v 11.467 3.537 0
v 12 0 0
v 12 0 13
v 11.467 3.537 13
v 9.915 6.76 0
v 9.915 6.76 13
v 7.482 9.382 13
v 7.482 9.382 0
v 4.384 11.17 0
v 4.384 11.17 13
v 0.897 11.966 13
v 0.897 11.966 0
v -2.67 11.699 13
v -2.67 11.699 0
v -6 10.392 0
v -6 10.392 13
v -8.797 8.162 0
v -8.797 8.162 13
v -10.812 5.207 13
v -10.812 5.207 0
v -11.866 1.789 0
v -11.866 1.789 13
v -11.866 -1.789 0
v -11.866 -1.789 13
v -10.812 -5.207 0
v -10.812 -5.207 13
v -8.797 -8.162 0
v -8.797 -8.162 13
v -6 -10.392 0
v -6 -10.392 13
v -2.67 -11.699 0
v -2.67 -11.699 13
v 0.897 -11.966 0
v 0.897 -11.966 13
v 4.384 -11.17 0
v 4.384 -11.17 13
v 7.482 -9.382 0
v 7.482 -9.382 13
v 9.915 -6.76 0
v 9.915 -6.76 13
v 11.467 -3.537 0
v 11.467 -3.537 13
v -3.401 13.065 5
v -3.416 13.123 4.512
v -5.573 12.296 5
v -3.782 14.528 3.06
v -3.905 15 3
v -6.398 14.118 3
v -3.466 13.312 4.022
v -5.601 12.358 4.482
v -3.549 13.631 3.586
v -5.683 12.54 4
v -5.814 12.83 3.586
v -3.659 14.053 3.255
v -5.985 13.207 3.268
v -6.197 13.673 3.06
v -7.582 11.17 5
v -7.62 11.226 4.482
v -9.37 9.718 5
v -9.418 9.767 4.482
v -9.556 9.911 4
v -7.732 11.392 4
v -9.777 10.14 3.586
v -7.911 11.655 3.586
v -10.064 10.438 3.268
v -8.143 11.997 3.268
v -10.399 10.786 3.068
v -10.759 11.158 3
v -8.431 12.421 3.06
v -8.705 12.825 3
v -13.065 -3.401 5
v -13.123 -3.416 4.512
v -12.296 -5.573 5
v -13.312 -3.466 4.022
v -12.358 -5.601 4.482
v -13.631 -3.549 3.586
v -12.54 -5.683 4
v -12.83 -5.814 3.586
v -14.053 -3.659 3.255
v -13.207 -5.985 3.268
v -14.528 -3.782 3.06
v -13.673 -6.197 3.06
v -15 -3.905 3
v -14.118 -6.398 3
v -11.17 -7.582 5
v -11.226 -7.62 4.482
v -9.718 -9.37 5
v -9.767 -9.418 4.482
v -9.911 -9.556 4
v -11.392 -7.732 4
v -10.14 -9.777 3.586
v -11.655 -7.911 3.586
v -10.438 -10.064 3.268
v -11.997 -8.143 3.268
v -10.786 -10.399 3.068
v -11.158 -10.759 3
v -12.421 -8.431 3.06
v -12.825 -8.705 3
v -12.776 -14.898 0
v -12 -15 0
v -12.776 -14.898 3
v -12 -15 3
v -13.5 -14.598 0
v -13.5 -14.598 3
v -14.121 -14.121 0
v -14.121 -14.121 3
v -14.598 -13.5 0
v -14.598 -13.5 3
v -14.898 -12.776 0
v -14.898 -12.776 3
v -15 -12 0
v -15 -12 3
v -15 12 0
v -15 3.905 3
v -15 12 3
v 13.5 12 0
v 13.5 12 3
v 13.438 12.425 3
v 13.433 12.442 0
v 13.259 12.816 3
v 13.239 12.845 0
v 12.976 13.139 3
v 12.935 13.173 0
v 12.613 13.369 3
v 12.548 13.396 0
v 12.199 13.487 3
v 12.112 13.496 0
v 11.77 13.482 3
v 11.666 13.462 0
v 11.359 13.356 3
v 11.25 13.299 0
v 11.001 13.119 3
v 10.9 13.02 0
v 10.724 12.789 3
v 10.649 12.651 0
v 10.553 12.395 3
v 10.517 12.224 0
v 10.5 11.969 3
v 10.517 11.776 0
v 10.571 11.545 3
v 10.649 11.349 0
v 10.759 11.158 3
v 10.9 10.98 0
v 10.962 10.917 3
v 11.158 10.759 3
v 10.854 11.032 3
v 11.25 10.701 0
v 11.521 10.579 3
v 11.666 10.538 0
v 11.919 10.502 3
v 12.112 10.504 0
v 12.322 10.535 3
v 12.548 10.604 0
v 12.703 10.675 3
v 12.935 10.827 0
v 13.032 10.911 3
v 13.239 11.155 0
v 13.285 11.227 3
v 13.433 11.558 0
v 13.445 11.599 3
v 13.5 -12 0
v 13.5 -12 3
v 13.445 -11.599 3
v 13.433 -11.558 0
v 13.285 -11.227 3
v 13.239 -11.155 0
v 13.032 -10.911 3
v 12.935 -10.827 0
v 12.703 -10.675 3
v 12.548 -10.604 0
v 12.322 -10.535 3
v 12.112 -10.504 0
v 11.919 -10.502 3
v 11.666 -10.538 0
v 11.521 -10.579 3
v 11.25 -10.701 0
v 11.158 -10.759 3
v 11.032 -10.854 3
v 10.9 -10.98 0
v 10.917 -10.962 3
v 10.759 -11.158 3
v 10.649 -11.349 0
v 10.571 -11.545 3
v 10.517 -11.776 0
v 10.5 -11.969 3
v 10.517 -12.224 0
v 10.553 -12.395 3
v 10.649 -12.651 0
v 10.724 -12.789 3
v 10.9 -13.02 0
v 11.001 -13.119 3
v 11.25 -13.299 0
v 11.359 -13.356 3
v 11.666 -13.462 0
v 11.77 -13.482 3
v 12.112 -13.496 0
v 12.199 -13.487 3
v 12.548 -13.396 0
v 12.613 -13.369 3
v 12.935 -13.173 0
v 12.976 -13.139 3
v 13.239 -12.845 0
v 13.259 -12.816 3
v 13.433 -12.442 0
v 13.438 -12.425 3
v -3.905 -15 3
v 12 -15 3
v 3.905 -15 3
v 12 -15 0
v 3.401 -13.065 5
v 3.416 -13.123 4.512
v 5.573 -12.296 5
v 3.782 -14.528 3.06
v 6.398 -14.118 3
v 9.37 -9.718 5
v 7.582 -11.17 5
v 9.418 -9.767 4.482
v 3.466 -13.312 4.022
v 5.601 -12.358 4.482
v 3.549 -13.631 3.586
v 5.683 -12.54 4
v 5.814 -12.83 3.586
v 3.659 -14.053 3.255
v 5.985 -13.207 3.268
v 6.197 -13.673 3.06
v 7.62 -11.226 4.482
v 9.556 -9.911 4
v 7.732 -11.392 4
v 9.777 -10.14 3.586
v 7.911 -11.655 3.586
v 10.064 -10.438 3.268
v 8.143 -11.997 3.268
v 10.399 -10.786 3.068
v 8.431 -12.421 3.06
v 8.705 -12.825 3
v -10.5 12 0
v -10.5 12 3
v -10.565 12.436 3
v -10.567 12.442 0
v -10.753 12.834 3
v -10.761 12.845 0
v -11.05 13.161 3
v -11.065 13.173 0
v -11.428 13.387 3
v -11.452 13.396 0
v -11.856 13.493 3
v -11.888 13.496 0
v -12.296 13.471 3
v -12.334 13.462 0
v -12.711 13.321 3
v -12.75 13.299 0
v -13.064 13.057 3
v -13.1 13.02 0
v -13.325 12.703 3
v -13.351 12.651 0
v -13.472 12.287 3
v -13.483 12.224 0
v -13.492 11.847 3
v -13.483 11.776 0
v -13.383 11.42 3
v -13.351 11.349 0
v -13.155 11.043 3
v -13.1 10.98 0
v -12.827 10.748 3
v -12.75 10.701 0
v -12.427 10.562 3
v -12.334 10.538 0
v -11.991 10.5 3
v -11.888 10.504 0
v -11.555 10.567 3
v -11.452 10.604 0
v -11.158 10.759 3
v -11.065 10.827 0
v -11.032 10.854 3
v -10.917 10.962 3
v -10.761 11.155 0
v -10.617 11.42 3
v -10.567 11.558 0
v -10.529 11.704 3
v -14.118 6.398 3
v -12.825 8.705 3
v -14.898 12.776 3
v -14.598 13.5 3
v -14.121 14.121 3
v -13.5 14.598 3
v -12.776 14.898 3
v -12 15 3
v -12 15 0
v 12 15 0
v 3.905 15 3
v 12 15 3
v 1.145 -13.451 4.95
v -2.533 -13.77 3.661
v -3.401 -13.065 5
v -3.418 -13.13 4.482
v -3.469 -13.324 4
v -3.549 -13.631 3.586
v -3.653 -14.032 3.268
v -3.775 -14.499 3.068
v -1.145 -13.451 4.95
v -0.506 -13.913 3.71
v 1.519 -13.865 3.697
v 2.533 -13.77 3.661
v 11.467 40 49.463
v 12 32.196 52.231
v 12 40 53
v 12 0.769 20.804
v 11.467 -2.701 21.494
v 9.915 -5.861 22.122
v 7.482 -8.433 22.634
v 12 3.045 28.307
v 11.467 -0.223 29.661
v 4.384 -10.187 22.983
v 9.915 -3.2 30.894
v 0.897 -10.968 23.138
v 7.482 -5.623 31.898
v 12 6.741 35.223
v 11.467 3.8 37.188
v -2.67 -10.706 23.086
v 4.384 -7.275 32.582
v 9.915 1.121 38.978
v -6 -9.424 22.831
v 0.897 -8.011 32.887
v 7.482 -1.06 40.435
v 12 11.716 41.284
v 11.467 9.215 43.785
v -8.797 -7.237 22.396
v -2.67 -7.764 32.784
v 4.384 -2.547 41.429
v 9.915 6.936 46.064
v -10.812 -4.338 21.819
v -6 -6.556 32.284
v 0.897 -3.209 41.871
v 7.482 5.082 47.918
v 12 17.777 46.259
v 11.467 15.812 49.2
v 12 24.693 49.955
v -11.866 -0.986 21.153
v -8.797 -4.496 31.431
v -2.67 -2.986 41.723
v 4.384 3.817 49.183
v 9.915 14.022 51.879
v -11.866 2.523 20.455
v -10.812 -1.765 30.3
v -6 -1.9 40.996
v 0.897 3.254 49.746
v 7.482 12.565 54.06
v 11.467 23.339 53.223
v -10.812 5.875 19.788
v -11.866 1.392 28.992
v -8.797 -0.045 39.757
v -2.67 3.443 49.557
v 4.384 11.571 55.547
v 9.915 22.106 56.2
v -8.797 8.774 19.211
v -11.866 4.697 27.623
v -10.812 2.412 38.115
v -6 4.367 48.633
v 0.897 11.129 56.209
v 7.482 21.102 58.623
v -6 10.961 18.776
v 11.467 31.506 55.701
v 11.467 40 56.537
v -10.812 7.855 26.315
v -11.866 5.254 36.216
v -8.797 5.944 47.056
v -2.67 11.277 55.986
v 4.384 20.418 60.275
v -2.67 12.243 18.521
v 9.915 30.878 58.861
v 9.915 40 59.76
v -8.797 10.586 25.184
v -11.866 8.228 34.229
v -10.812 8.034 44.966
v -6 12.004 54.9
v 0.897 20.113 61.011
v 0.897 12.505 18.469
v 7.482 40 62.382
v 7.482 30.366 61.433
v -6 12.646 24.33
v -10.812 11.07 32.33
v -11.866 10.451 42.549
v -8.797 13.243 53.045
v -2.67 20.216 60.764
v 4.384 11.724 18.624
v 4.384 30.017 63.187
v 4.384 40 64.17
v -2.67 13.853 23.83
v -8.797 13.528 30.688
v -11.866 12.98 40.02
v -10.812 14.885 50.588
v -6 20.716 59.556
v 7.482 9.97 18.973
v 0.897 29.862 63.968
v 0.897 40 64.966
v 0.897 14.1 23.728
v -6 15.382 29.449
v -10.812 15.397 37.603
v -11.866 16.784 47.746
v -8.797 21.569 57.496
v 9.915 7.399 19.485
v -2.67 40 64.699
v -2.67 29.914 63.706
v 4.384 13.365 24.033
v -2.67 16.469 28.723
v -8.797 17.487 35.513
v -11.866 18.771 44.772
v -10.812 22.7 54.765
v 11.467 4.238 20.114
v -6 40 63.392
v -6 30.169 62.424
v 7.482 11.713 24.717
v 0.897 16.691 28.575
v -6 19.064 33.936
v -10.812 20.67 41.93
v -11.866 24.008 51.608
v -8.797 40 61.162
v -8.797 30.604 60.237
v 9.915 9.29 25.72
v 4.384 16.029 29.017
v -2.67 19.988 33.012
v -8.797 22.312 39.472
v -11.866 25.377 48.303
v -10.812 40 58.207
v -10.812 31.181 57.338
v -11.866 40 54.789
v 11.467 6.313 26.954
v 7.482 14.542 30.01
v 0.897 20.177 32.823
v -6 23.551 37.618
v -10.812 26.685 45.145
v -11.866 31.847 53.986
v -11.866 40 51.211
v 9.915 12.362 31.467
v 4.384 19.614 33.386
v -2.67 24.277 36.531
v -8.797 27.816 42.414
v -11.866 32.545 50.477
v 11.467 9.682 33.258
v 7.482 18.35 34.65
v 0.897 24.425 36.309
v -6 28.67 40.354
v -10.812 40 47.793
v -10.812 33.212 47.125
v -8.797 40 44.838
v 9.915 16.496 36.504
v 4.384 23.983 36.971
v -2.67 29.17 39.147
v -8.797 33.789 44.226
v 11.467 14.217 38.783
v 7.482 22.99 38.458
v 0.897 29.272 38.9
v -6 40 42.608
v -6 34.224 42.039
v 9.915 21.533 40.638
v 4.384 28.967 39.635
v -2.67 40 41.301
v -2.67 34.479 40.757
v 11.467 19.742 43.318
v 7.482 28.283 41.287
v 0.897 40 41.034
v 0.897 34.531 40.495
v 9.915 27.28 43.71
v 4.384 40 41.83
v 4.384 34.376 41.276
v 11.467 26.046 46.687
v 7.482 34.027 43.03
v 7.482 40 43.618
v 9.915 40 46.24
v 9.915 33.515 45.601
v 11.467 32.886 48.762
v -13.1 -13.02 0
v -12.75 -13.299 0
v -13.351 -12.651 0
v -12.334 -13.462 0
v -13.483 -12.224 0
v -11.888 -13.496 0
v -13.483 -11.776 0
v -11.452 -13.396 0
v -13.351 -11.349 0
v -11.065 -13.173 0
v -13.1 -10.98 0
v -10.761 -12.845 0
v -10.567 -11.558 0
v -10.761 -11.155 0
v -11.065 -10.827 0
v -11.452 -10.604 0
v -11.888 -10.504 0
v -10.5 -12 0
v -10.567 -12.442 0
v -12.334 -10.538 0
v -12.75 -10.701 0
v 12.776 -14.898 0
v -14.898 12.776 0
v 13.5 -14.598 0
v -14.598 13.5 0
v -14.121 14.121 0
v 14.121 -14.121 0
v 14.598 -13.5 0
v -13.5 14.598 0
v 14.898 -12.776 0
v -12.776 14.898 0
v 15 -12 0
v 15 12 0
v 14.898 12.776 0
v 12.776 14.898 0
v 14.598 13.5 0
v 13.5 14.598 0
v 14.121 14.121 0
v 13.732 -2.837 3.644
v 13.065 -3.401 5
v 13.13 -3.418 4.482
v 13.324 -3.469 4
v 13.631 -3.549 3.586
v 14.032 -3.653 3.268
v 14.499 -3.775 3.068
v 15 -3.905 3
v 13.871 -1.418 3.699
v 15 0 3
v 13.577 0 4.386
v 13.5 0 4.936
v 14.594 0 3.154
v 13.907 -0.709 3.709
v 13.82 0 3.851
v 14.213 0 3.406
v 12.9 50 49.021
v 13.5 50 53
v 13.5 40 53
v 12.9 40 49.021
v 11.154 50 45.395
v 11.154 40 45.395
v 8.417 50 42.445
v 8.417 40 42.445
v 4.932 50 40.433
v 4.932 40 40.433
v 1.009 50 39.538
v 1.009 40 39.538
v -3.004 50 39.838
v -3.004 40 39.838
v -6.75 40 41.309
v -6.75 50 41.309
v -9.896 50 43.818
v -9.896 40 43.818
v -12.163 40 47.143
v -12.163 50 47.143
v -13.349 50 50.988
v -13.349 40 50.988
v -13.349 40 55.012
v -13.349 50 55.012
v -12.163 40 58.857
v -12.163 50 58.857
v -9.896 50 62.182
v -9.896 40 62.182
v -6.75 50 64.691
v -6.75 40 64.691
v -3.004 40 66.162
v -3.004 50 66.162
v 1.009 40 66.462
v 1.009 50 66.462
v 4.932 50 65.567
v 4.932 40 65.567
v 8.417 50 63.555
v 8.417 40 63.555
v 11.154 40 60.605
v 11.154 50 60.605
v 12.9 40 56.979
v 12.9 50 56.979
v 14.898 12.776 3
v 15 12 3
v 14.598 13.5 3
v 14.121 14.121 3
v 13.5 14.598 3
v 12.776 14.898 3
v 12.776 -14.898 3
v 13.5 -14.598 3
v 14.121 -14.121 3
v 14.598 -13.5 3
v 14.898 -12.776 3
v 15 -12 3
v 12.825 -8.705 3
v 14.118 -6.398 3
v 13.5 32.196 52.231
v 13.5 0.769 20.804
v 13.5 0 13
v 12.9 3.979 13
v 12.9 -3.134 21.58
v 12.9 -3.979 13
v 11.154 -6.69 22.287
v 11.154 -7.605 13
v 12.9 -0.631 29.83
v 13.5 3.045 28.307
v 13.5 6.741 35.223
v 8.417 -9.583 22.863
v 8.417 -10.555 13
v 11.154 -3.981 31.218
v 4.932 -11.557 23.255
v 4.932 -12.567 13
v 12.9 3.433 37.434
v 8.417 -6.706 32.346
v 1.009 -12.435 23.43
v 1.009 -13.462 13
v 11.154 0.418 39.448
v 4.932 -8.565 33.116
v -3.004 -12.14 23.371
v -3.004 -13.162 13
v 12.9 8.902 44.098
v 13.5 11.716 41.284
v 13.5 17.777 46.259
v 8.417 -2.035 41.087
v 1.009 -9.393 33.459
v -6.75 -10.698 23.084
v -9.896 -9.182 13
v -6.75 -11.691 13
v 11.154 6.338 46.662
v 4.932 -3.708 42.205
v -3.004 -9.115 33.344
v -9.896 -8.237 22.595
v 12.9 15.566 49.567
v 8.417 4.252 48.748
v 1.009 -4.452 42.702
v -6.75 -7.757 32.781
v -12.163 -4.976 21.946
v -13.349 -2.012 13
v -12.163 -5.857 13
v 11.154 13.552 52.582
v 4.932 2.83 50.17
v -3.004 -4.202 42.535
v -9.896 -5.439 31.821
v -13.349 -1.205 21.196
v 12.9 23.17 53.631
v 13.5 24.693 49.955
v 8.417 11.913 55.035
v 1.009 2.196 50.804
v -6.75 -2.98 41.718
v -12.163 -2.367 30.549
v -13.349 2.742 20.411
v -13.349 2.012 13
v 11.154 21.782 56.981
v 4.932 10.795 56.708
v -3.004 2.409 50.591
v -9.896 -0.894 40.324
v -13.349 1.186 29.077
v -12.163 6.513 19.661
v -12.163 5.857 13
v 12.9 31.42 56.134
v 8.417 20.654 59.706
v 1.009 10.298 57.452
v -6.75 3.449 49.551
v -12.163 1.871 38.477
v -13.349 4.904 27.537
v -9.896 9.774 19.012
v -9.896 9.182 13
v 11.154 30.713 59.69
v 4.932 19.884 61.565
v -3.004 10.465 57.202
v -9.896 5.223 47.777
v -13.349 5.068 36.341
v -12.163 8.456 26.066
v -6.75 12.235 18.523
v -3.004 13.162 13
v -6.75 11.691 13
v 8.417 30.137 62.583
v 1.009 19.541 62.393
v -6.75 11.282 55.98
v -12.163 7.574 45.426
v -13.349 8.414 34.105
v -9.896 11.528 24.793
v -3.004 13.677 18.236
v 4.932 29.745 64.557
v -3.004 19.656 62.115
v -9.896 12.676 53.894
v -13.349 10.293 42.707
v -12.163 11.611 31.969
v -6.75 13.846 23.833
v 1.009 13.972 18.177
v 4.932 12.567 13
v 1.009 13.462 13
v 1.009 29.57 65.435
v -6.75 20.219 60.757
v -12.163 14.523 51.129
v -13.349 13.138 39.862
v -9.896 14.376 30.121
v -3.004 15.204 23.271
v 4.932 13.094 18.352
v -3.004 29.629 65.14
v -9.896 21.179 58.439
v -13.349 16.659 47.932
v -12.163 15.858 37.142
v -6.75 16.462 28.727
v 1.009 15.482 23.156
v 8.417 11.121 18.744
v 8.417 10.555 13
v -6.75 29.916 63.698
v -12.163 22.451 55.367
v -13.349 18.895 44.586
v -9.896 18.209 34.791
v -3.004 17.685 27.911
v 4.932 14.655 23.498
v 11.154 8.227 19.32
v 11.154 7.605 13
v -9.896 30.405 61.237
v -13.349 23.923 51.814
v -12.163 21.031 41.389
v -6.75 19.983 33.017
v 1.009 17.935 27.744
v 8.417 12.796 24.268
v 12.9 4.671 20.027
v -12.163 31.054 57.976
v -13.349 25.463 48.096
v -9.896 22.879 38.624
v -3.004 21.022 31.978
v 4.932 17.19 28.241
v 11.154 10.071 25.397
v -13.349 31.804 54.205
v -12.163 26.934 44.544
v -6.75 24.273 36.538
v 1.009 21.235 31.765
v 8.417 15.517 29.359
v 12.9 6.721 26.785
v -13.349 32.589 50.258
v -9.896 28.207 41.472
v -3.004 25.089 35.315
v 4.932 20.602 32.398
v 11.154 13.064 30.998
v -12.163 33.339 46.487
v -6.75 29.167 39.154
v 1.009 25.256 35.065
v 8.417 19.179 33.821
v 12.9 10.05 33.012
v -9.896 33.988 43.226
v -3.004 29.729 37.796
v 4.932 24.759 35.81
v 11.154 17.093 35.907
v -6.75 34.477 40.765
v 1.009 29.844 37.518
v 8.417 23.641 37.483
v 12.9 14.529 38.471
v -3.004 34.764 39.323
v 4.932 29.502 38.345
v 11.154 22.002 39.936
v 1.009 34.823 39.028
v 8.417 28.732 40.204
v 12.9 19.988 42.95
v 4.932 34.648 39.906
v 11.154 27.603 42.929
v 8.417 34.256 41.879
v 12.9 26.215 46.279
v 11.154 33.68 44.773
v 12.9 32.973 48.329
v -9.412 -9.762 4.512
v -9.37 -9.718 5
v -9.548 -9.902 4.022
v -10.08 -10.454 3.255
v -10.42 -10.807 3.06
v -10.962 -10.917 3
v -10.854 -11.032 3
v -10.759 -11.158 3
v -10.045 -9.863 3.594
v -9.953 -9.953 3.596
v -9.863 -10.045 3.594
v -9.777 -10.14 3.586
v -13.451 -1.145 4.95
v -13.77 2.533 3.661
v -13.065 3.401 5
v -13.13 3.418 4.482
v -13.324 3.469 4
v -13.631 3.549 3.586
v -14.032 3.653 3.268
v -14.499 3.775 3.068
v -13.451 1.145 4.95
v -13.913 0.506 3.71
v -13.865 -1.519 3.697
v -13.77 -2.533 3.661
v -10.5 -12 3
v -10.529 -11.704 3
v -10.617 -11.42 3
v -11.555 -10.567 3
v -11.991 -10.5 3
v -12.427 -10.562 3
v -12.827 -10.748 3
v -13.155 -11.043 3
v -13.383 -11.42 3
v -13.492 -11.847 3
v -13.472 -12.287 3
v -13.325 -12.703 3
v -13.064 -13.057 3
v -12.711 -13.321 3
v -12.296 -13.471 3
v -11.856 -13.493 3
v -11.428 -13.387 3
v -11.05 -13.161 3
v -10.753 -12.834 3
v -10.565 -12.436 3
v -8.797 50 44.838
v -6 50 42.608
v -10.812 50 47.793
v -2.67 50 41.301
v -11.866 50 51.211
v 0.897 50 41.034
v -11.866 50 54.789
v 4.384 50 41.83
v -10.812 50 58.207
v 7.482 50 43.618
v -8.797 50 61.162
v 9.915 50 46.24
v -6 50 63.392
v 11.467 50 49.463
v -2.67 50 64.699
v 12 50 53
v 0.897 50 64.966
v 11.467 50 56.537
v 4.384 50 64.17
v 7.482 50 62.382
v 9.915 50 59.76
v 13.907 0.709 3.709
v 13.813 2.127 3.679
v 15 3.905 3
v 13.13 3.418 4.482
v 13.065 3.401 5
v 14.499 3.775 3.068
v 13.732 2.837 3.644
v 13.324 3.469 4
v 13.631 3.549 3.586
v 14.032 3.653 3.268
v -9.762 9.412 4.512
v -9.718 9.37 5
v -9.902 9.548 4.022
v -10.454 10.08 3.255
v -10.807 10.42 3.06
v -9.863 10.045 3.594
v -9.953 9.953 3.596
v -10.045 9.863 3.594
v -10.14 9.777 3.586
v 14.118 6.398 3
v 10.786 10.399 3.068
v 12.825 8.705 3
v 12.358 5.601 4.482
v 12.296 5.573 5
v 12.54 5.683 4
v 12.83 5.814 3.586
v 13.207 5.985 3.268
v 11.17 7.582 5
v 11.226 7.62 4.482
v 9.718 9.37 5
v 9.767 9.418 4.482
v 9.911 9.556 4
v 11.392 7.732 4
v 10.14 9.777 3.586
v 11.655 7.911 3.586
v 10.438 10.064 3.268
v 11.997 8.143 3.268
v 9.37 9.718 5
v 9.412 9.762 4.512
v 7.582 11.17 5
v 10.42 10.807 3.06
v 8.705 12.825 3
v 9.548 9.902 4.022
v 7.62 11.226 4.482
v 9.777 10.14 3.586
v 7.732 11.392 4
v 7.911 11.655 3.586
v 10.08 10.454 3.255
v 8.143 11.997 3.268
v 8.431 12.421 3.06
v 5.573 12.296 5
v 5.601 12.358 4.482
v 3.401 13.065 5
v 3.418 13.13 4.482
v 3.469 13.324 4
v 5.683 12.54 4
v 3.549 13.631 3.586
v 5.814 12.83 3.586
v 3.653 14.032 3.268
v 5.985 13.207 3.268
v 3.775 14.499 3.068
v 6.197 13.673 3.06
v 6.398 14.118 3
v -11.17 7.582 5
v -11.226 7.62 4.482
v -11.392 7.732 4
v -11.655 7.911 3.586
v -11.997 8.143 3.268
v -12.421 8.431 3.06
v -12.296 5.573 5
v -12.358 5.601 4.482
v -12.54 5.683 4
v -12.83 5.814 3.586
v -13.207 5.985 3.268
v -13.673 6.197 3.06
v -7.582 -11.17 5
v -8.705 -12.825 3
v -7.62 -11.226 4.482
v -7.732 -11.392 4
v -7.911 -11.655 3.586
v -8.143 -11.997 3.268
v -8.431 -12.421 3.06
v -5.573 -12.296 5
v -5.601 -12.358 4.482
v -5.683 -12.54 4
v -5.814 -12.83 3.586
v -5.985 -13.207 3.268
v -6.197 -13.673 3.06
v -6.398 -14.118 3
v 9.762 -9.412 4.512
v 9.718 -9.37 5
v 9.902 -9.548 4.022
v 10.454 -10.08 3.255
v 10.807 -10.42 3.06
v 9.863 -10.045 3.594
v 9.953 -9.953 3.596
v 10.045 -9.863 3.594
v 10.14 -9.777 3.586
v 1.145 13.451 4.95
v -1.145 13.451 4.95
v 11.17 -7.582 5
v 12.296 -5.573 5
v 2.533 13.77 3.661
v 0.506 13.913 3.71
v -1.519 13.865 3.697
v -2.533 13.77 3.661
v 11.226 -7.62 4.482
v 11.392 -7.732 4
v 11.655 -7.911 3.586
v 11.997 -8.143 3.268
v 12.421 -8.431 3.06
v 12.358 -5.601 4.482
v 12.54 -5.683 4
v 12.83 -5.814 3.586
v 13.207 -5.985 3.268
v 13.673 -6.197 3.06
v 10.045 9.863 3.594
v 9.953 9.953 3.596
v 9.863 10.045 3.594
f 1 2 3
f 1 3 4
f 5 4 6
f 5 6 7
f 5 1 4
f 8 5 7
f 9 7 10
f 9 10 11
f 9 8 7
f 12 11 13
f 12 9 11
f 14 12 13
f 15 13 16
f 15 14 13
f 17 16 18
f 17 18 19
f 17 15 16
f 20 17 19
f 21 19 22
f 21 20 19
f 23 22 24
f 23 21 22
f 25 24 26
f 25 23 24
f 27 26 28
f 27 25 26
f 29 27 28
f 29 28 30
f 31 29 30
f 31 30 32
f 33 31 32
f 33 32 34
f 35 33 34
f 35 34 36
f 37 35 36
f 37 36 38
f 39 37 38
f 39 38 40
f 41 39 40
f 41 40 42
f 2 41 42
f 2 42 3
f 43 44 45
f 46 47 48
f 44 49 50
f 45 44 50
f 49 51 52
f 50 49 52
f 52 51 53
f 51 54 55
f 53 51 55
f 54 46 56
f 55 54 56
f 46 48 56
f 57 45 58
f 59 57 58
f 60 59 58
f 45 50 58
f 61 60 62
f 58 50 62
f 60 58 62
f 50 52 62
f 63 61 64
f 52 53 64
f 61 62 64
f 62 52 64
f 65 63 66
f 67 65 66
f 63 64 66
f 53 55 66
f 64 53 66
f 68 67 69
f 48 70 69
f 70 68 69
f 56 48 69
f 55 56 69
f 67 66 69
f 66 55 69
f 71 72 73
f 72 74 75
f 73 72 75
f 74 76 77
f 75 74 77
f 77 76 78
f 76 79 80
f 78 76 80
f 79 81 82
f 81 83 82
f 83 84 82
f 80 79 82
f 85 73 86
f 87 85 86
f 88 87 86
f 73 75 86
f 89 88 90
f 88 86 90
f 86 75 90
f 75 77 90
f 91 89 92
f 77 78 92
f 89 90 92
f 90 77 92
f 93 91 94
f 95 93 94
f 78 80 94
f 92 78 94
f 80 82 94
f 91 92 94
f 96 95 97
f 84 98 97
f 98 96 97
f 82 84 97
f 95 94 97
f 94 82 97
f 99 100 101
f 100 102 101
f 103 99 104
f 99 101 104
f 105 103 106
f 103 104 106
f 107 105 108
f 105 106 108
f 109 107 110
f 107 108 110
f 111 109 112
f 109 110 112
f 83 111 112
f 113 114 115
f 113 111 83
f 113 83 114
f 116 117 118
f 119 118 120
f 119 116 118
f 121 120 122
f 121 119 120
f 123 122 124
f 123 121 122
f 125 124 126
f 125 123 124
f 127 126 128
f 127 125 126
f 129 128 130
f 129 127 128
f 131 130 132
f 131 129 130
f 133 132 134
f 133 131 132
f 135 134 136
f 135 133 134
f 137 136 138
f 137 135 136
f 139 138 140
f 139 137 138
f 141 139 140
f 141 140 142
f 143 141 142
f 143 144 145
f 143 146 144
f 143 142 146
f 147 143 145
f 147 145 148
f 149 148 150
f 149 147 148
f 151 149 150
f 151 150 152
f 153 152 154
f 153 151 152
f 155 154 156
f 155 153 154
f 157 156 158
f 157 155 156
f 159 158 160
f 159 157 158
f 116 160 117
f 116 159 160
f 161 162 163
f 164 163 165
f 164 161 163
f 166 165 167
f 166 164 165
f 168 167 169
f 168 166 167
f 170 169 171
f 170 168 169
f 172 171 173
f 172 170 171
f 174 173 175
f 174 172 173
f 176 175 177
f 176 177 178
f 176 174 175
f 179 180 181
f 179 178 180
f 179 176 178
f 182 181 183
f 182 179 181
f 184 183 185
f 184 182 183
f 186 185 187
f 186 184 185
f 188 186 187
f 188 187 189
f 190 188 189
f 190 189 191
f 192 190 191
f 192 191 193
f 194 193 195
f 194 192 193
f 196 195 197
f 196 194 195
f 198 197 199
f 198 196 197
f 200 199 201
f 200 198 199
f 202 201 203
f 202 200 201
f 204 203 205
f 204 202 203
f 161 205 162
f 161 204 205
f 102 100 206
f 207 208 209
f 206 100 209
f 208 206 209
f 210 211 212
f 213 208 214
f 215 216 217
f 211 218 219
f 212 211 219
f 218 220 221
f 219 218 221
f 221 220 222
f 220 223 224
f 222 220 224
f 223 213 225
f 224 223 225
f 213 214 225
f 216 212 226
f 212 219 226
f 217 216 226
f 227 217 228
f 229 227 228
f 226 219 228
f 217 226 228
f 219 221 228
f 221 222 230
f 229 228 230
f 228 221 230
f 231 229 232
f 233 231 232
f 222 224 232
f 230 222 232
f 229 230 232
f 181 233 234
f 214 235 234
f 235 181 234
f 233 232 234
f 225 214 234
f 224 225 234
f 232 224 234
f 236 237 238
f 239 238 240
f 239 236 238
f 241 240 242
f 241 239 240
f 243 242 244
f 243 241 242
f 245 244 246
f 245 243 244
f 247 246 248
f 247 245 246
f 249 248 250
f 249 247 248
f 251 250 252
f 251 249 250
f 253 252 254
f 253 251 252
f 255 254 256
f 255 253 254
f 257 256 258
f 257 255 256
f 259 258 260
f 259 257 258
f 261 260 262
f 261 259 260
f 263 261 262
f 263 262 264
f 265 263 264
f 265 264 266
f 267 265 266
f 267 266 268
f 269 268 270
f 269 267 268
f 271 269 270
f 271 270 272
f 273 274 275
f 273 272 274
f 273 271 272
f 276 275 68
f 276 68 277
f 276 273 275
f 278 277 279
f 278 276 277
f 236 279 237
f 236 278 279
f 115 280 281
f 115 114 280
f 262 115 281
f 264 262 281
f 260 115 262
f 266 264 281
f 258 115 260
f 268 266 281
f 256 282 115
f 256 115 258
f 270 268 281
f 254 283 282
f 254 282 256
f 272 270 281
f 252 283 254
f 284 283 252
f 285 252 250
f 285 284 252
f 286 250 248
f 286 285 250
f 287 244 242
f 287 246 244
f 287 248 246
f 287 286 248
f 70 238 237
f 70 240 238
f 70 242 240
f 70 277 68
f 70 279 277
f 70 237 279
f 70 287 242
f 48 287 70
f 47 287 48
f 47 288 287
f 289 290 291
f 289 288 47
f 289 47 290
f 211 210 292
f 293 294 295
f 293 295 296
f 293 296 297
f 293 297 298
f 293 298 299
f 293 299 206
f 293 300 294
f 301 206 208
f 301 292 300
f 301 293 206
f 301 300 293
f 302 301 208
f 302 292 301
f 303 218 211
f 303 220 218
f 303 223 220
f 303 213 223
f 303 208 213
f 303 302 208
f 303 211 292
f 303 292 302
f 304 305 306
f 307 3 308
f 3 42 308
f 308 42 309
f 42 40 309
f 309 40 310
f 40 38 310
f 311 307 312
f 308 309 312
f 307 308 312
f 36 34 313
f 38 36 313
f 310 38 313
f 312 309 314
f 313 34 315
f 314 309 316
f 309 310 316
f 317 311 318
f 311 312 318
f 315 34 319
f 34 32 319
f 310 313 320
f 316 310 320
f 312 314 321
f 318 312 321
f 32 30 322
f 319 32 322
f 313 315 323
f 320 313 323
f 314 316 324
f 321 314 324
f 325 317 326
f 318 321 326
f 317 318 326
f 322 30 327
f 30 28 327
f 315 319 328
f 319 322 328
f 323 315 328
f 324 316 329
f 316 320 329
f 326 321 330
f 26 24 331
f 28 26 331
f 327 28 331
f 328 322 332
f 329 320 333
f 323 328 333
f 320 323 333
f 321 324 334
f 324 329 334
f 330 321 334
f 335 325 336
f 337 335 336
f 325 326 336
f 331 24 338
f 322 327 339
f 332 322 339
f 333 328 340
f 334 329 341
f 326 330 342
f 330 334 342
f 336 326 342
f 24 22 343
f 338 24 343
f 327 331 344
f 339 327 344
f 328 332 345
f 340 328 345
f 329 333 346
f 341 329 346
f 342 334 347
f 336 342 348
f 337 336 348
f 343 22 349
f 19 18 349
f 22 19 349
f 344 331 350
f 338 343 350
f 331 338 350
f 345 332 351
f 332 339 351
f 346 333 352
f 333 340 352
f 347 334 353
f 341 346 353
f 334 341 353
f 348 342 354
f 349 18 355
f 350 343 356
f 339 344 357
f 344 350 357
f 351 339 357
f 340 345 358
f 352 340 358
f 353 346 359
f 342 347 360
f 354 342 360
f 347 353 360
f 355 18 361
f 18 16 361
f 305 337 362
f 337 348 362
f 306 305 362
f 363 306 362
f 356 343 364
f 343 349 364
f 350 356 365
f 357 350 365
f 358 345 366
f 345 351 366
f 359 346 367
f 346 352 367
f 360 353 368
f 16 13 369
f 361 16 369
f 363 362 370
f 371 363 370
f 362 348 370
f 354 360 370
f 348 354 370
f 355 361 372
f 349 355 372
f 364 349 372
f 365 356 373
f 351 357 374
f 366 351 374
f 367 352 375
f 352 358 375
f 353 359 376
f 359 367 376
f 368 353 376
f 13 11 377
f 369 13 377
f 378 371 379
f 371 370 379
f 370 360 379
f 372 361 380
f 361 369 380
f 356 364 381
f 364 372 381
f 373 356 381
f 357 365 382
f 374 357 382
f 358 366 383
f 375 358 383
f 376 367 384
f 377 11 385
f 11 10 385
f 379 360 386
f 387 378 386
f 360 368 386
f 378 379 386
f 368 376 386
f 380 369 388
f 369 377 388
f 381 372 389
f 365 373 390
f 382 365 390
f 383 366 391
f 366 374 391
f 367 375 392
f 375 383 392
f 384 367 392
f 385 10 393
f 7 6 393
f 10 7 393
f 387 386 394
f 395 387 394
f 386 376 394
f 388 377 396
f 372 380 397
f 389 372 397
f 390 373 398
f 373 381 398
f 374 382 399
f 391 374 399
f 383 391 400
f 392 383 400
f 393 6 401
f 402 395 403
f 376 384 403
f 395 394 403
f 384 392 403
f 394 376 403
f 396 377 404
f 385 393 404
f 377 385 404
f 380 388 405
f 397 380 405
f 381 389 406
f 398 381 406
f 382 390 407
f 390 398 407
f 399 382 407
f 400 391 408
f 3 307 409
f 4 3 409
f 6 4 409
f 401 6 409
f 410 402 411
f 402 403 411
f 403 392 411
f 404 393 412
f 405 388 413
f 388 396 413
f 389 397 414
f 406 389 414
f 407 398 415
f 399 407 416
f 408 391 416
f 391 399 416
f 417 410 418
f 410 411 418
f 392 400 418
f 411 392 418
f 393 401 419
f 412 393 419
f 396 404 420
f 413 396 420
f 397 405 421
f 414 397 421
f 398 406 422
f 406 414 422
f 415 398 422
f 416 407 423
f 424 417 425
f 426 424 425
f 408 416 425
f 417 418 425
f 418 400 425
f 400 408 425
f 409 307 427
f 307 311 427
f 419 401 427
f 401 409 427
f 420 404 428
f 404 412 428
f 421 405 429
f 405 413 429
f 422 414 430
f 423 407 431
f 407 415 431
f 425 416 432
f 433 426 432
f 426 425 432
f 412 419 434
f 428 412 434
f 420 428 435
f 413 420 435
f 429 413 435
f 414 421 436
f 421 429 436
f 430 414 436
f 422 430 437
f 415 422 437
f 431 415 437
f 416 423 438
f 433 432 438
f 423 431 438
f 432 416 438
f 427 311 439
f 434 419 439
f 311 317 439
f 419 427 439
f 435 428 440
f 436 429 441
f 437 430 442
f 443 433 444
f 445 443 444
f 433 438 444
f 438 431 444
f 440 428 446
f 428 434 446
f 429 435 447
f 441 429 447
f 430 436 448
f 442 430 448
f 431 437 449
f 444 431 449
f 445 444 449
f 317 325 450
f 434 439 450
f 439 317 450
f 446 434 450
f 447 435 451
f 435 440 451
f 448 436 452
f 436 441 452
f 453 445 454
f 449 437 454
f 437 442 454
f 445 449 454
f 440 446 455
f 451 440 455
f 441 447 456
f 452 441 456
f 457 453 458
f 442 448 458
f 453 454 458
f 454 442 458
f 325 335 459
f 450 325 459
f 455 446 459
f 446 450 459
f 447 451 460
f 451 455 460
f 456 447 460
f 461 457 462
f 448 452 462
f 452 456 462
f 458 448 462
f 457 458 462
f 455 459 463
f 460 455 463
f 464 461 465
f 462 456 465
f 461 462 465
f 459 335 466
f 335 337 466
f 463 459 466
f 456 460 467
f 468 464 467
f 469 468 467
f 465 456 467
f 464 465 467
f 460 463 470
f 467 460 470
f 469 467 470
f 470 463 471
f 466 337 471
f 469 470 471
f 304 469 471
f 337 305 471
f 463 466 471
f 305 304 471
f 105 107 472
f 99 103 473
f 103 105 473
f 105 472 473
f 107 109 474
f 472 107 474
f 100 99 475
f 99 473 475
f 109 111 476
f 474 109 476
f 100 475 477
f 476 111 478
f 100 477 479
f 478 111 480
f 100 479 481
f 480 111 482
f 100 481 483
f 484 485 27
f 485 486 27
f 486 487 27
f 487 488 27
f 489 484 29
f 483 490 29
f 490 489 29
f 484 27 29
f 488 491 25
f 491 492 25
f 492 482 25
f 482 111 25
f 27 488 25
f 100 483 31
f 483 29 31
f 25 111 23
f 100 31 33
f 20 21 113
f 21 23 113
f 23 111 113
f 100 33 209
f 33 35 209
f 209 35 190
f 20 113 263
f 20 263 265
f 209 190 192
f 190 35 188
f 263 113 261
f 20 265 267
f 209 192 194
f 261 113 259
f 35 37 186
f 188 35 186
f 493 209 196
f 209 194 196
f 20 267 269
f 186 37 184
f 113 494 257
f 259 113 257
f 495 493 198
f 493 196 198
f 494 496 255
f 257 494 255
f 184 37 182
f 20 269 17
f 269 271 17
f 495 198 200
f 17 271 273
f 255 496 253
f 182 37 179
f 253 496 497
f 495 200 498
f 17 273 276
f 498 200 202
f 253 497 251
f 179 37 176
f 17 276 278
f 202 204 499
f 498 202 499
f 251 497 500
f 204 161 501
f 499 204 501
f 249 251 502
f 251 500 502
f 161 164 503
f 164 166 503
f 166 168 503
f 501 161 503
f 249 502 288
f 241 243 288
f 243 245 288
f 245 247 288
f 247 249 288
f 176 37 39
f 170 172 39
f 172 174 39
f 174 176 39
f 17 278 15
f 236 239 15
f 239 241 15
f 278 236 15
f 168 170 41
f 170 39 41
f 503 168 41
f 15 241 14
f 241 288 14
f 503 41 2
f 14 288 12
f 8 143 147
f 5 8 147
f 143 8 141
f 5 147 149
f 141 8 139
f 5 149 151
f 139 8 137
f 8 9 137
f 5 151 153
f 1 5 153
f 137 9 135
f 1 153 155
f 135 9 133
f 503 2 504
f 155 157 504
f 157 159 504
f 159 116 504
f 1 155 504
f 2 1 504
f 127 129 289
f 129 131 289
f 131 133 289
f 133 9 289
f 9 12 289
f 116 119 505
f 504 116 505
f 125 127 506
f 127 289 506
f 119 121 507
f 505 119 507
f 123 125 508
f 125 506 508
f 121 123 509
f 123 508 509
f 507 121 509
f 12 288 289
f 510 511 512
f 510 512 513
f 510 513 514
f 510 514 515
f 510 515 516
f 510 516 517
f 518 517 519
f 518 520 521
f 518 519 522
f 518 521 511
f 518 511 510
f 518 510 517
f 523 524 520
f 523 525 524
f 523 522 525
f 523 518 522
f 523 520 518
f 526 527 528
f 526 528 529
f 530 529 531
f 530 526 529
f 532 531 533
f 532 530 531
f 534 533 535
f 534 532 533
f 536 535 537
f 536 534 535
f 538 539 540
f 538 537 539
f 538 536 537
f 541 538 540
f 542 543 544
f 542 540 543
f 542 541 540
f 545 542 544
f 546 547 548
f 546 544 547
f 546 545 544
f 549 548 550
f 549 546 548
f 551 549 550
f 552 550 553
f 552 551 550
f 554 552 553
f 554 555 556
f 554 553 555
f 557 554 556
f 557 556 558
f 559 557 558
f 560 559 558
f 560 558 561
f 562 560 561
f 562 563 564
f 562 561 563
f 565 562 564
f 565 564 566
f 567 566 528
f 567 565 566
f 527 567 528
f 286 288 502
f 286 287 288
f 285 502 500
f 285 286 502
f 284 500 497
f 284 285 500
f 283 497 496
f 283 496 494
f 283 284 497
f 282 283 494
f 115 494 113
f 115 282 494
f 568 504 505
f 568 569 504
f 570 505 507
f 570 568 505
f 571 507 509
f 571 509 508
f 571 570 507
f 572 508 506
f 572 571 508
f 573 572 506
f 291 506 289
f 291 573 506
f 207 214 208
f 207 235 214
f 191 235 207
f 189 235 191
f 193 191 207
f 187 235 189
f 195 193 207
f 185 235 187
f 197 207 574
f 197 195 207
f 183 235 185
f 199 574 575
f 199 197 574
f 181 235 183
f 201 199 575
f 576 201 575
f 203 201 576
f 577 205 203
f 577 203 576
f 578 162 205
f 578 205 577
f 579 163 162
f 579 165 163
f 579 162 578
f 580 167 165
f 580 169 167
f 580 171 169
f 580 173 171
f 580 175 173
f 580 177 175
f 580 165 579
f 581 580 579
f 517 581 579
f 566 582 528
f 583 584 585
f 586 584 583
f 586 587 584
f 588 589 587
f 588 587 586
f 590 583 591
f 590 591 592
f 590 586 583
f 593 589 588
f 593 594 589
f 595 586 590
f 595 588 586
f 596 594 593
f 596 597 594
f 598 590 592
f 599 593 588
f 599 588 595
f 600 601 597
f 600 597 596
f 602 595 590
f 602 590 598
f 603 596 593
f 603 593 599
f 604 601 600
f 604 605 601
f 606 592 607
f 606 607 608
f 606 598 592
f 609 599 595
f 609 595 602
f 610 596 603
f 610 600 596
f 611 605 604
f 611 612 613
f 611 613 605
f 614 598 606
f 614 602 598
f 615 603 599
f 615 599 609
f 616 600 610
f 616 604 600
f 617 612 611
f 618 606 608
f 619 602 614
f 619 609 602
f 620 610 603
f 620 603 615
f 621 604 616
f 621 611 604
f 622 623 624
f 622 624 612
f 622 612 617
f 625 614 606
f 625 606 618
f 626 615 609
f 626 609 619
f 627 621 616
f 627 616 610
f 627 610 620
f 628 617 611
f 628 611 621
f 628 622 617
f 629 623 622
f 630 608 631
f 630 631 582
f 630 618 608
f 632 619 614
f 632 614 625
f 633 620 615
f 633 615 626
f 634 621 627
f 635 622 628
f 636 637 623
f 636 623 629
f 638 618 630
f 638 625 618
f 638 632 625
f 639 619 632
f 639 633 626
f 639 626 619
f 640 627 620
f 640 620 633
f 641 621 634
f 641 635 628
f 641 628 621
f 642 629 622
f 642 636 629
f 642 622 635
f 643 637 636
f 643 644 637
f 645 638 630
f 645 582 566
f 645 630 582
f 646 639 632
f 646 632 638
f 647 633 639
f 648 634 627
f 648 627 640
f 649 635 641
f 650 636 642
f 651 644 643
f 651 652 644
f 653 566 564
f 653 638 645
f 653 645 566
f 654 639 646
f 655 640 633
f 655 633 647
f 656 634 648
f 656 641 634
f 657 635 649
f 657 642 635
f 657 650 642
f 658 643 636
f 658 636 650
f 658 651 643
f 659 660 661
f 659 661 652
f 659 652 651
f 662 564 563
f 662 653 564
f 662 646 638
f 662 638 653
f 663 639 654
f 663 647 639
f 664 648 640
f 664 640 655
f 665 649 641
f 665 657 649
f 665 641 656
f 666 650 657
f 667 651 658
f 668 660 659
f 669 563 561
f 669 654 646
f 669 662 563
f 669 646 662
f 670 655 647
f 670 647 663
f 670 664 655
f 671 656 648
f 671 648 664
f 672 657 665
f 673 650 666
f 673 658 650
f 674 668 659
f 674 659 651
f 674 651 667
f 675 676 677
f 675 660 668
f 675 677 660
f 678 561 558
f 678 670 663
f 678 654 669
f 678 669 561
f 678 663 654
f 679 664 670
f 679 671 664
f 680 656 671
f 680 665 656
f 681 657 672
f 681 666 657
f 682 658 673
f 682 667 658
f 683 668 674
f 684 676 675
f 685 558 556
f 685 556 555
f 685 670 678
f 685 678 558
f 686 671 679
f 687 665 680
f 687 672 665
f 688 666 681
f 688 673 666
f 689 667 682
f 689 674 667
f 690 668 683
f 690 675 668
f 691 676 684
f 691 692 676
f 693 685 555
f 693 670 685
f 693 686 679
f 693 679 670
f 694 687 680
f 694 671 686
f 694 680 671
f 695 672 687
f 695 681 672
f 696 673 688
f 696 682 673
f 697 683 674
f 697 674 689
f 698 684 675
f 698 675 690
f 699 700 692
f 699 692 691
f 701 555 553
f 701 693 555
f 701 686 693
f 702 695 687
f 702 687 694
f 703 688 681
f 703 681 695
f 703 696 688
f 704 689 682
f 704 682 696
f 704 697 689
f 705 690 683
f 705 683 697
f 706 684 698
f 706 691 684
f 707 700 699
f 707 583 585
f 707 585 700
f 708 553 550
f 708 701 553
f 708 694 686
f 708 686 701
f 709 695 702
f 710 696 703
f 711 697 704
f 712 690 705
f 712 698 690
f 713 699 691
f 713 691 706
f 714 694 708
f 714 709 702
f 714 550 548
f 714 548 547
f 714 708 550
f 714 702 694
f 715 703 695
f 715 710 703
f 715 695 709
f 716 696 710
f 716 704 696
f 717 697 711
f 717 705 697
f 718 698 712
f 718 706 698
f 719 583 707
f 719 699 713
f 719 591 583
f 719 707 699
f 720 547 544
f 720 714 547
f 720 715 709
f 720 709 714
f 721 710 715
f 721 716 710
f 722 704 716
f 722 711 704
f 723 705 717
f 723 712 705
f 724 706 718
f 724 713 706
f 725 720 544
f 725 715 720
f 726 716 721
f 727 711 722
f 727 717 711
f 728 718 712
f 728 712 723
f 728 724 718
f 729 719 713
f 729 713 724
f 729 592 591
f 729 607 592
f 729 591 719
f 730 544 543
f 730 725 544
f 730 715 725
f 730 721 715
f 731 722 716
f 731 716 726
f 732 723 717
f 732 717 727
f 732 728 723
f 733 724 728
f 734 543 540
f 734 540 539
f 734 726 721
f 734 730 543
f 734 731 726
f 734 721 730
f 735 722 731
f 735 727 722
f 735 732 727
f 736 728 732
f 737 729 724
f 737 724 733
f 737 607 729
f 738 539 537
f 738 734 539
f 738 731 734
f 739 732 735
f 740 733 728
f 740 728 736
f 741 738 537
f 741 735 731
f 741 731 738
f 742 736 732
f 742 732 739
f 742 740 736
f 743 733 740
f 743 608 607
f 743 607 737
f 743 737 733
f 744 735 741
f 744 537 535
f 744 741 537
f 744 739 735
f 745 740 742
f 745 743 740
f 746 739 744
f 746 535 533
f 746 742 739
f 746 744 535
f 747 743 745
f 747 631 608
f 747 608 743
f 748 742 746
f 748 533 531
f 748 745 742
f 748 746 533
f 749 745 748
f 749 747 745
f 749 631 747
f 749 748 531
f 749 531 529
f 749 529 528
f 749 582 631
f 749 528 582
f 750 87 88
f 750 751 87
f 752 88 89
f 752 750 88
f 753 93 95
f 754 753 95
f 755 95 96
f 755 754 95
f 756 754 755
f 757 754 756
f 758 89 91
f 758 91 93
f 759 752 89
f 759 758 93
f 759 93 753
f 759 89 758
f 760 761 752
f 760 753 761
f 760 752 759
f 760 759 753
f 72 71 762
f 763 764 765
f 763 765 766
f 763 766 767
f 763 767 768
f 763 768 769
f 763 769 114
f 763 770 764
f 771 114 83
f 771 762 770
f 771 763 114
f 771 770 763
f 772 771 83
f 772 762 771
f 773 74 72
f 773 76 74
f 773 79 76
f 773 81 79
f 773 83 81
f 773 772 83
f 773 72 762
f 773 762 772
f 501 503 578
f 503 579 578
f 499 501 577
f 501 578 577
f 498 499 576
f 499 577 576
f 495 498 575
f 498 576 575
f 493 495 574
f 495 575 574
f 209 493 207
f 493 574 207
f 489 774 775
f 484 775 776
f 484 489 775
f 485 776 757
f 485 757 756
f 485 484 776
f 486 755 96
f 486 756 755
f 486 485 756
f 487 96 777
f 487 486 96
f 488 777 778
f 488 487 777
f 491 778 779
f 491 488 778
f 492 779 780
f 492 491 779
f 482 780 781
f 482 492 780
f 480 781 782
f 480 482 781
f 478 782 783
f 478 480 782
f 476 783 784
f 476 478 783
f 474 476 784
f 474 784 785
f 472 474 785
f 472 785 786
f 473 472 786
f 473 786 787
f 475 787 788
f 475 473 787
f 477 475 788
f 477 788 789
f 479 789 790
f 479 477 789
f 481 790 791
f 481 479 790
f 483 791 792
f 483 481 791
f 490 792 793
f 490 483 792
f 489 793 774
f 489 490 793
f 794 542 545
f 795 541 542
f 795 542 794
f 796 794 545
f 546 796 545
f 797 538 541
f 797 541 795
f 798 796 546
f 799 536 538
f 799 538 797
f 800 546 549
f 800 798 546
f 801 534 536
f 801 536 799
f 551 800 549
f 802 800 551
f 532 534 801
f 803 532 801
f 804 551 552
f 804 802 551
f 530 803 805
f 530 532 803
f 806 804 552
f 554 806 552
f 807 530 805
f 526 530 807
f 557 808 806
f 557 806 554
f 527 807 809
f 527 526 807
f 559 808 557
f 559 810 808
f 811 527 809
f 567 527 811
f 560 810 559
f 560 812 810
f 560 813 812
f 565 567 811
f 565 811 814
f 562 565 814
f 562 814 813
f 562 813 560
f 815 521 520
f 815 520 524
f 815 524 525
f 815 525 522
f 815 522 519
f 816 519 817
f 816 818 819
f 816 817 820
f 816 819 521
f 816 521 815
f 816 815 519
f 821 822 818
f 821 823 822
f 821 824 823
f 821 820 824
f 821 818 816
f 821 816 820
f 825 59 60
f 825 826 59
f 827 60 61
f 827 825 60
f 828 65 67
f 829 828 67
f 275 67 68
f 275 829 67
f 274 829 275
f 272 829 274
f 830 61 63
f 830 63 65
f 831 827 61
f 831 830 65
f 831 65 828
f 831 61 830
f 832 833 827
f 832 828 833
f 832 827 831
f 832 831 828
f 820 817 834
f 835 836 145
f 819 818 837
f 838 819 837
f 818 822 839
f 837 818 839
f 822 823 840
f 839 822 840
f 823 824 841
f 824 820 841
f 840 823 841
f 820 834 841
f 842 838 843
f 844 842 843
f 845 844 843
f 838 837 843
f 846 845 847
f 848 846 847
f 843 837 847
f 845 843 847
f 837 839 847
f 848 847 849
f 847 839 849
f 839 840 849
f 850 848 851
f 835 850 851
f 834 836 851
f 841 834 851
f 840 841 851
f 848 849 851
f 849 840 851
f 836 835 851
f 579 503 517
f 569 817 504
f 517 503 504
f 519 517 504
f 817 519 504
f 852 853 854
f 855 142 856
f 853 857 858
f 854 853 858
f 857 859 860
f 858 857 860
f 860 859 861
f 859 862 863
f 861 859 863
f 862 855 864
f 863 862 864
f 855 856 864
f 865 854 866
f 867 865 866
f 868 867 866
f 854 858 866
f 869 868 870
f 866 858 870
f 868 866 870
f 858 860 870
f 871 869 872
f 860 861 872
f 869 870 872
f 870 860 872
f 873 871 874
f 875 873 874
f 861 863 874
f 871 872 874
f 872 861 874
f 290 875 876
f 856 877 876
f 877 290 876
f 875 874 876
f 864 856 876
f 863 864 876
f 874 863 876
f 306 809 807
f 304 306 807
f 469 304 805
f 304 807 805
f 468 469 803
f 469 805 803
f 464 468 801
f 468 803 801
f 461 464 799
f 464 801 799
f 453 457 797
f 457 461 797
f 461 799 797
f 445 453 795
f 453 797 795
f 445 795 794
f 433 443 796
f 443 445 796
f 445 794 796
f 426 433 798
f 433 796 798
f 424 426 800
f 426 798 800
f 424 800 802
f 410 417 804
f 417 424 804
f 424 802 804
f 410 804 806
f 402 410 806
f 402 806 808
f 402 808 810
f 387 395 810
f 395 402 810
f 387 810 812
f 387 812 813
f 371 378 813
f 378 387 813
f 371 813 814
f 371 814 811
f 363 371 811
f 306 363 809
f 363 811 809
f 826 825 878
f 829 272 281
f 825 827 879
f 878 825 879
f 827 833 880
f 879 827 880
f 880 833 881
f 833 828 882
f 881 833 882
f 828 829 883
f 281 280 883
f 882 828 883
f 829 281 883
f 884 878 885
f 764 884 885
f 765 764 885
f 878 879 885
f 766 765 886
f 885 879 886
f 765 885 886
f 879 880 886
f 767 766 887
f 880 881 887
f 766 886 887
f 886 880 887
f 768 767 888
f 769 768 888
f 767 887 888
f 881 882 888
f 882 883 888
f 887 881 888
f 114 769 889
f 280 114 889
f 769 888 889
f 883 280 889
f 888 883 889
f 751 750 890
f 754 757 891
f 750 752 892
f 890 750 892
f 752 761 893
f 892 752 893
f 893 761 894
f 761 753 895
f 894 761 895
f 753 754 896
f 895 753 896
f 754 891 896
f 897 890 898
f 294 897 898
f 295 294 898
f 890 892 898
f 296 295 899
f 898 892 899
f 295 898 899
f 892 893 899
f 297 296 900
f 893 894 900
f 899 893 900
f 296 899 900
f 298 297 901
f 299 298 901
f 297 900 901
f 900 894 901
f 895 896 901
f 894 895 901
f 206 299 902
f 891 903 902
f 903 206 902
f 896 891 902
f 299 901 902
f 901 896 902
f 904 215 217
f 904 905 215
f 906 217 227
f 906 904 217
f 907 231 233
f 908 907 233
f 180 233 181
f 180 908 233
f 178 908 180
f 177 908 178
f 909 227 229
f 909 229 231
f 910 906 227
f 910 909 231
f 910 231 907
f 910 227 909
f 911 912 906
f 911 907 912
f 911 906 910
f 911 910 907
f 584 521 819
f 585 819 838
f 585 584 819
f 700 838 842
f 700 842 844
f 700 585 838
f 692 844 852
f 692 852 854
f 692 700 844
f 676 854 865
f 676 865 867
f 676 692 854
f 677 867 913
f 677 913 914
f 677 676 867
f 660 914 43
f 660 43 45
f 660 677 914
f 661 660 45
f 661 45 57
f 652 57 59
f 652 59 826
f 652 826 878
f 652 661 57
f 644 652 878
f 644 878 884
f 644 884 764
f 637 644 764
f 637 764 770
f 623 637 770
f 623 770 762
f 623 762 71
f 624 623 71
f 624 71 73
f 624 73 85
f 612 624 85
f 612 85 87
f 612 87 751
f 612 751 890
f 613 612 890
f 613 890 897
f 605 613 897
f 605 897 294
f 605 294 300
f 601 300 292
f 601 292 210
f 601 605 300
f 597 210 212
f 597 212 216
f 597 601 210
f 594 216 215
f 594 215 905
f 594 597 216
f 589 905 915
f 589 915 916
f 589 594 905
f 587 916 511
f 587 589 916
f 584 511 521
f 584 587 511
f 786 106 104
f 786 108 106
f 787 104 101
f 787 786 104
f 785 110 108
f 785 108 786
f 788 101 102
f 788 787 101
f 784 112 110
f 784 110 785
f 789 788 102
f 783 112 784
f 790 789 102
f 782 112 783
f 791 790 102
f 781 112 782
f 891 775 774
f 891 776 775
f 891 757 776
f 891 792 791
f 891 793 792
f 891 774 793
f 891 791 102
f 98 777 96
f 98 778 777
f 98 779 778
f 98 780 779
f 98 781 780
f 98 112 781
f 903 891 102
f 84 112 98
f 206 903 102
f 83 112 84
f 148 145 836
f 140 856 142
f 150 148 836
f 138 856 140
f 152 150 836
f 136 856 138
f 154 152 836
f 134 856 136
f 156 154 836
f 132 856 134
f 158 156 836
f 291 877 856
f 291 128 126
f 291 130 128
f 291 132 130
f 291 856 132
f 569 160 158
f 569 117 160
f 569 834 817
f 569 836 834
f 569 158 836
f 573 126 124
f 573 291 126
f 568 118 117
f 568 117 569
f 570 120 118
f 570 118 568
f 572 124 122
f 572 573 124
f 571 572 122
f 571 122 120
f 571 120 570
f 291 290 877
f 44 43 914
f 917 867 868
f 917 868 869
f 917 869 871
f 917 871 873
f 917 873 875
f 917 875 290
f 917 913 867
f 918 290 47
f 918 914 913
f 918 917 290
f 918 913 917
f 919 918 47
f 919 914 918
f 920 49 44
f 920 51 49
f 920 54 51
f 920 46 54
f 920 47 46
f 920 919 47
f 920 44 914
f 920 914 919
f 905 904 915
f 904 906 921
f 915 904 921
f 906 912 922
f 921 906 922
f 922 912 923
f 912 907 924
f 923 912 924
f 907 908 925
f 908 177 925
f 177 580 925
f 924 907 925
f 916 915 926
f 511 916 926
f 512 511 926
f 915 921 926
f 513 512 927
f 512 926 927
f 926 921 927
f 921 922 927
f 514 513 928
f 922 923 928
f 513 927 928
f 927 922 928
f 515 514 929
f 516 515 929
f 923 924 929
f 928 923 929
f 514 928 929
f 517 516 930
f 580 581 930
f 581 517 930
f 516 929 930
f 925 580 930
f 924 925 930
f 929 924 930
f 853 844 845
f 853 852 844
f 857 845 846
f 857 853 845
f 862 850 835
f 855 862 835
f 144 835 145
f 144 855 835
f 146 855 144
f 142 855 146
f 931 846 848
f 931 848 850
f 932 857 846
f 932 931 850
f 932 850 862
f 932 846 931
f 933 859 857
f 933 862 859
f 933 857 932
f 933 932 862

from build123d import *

# Parameters (mm, degrees)
ESQUISSE1_W        = 30
ESQUISSE1_H        = 30
ESQUISSE1_R        = 12
ESQUISSE1_R_2      = 1.5
BOSS_EXTRU_1_DEPTH = 3
ESQUISSE4_R        = 13.5
ESQUISSE4_R_2      = 12
CONG_1_R           = 2
CONG_2_R           = 3


with BuildPart() as part:
    # Esquisse1 → Boss.-Extru.1 (new body)
    with BuildSketch(Plane.XY):
        Rectangle(ESQUISSE1_W, ESQUISSE1_H)
        Circle(ESQUISSE1_R, mode=Mode.SUBTRACT)
        with Locations((-12, 12)):
            Circle(ESQUISSE1_R_2, mode=Mode.SUBTRACT)
        with Locations((12, 12)):
            Circle(ESQUISSE1_R_2, mode=Mode.SUBTRACT)
        with Locations((12, -12)):
            Circle(ESQUISSE1_R_2, mode=Mode.SUBTRACT)
        with Locations((-12, -12)):
            Circle(ESQUISSE1_R_2, mode=Mode.SUBTRACT)
    extrude(amount=BOSS_EXTRU_1_DEPTH)

    # Balayage-Mince1: sweep along a path in Esquisse2
    with BuildLine(Plane(origin=(0, 0, 0), x_dir=(0, 0, -1), z_dir=(1, 0, 0))) as balayage_mince1_path:
        Line((-3, 0), (-13, 0))
        ThreePointArc((-13, 0), (-41.284271247, 11.715728753), (-53, 40))
        Line((-53, 40), (-53, 50))
    # Esquisse4 → Balayage-Mince1 (sweep)
    with BuildSketch(Plane.XY.offset(3)):
        Circle(ESQUISSE4_R)
        Circle(ESQUISSE4_R_2, mode=Mode.SUBTRACT)
    sweep(path=balayage_mince1_path.line)

    # Congé1
    cong_1_edges = [part.edges().sort_by_distance(p)[0] for p in [
        (-13.5, 0, 3),
    ]]
    fillet(cong_1_edges, radius=CONG_1_R)

    # Congé2
    cong_2_edges = [part.edges().sort_by_distance(p)[0] for p in [
        (15, -15, 1.5),
        (-15, -15, 1.5),
        (-15, 15, 1.5),
        (15, 15, 1.5),
    ]]
    fillet(cong_2_edges, radius=CONG_2_R)


solid = part.part
